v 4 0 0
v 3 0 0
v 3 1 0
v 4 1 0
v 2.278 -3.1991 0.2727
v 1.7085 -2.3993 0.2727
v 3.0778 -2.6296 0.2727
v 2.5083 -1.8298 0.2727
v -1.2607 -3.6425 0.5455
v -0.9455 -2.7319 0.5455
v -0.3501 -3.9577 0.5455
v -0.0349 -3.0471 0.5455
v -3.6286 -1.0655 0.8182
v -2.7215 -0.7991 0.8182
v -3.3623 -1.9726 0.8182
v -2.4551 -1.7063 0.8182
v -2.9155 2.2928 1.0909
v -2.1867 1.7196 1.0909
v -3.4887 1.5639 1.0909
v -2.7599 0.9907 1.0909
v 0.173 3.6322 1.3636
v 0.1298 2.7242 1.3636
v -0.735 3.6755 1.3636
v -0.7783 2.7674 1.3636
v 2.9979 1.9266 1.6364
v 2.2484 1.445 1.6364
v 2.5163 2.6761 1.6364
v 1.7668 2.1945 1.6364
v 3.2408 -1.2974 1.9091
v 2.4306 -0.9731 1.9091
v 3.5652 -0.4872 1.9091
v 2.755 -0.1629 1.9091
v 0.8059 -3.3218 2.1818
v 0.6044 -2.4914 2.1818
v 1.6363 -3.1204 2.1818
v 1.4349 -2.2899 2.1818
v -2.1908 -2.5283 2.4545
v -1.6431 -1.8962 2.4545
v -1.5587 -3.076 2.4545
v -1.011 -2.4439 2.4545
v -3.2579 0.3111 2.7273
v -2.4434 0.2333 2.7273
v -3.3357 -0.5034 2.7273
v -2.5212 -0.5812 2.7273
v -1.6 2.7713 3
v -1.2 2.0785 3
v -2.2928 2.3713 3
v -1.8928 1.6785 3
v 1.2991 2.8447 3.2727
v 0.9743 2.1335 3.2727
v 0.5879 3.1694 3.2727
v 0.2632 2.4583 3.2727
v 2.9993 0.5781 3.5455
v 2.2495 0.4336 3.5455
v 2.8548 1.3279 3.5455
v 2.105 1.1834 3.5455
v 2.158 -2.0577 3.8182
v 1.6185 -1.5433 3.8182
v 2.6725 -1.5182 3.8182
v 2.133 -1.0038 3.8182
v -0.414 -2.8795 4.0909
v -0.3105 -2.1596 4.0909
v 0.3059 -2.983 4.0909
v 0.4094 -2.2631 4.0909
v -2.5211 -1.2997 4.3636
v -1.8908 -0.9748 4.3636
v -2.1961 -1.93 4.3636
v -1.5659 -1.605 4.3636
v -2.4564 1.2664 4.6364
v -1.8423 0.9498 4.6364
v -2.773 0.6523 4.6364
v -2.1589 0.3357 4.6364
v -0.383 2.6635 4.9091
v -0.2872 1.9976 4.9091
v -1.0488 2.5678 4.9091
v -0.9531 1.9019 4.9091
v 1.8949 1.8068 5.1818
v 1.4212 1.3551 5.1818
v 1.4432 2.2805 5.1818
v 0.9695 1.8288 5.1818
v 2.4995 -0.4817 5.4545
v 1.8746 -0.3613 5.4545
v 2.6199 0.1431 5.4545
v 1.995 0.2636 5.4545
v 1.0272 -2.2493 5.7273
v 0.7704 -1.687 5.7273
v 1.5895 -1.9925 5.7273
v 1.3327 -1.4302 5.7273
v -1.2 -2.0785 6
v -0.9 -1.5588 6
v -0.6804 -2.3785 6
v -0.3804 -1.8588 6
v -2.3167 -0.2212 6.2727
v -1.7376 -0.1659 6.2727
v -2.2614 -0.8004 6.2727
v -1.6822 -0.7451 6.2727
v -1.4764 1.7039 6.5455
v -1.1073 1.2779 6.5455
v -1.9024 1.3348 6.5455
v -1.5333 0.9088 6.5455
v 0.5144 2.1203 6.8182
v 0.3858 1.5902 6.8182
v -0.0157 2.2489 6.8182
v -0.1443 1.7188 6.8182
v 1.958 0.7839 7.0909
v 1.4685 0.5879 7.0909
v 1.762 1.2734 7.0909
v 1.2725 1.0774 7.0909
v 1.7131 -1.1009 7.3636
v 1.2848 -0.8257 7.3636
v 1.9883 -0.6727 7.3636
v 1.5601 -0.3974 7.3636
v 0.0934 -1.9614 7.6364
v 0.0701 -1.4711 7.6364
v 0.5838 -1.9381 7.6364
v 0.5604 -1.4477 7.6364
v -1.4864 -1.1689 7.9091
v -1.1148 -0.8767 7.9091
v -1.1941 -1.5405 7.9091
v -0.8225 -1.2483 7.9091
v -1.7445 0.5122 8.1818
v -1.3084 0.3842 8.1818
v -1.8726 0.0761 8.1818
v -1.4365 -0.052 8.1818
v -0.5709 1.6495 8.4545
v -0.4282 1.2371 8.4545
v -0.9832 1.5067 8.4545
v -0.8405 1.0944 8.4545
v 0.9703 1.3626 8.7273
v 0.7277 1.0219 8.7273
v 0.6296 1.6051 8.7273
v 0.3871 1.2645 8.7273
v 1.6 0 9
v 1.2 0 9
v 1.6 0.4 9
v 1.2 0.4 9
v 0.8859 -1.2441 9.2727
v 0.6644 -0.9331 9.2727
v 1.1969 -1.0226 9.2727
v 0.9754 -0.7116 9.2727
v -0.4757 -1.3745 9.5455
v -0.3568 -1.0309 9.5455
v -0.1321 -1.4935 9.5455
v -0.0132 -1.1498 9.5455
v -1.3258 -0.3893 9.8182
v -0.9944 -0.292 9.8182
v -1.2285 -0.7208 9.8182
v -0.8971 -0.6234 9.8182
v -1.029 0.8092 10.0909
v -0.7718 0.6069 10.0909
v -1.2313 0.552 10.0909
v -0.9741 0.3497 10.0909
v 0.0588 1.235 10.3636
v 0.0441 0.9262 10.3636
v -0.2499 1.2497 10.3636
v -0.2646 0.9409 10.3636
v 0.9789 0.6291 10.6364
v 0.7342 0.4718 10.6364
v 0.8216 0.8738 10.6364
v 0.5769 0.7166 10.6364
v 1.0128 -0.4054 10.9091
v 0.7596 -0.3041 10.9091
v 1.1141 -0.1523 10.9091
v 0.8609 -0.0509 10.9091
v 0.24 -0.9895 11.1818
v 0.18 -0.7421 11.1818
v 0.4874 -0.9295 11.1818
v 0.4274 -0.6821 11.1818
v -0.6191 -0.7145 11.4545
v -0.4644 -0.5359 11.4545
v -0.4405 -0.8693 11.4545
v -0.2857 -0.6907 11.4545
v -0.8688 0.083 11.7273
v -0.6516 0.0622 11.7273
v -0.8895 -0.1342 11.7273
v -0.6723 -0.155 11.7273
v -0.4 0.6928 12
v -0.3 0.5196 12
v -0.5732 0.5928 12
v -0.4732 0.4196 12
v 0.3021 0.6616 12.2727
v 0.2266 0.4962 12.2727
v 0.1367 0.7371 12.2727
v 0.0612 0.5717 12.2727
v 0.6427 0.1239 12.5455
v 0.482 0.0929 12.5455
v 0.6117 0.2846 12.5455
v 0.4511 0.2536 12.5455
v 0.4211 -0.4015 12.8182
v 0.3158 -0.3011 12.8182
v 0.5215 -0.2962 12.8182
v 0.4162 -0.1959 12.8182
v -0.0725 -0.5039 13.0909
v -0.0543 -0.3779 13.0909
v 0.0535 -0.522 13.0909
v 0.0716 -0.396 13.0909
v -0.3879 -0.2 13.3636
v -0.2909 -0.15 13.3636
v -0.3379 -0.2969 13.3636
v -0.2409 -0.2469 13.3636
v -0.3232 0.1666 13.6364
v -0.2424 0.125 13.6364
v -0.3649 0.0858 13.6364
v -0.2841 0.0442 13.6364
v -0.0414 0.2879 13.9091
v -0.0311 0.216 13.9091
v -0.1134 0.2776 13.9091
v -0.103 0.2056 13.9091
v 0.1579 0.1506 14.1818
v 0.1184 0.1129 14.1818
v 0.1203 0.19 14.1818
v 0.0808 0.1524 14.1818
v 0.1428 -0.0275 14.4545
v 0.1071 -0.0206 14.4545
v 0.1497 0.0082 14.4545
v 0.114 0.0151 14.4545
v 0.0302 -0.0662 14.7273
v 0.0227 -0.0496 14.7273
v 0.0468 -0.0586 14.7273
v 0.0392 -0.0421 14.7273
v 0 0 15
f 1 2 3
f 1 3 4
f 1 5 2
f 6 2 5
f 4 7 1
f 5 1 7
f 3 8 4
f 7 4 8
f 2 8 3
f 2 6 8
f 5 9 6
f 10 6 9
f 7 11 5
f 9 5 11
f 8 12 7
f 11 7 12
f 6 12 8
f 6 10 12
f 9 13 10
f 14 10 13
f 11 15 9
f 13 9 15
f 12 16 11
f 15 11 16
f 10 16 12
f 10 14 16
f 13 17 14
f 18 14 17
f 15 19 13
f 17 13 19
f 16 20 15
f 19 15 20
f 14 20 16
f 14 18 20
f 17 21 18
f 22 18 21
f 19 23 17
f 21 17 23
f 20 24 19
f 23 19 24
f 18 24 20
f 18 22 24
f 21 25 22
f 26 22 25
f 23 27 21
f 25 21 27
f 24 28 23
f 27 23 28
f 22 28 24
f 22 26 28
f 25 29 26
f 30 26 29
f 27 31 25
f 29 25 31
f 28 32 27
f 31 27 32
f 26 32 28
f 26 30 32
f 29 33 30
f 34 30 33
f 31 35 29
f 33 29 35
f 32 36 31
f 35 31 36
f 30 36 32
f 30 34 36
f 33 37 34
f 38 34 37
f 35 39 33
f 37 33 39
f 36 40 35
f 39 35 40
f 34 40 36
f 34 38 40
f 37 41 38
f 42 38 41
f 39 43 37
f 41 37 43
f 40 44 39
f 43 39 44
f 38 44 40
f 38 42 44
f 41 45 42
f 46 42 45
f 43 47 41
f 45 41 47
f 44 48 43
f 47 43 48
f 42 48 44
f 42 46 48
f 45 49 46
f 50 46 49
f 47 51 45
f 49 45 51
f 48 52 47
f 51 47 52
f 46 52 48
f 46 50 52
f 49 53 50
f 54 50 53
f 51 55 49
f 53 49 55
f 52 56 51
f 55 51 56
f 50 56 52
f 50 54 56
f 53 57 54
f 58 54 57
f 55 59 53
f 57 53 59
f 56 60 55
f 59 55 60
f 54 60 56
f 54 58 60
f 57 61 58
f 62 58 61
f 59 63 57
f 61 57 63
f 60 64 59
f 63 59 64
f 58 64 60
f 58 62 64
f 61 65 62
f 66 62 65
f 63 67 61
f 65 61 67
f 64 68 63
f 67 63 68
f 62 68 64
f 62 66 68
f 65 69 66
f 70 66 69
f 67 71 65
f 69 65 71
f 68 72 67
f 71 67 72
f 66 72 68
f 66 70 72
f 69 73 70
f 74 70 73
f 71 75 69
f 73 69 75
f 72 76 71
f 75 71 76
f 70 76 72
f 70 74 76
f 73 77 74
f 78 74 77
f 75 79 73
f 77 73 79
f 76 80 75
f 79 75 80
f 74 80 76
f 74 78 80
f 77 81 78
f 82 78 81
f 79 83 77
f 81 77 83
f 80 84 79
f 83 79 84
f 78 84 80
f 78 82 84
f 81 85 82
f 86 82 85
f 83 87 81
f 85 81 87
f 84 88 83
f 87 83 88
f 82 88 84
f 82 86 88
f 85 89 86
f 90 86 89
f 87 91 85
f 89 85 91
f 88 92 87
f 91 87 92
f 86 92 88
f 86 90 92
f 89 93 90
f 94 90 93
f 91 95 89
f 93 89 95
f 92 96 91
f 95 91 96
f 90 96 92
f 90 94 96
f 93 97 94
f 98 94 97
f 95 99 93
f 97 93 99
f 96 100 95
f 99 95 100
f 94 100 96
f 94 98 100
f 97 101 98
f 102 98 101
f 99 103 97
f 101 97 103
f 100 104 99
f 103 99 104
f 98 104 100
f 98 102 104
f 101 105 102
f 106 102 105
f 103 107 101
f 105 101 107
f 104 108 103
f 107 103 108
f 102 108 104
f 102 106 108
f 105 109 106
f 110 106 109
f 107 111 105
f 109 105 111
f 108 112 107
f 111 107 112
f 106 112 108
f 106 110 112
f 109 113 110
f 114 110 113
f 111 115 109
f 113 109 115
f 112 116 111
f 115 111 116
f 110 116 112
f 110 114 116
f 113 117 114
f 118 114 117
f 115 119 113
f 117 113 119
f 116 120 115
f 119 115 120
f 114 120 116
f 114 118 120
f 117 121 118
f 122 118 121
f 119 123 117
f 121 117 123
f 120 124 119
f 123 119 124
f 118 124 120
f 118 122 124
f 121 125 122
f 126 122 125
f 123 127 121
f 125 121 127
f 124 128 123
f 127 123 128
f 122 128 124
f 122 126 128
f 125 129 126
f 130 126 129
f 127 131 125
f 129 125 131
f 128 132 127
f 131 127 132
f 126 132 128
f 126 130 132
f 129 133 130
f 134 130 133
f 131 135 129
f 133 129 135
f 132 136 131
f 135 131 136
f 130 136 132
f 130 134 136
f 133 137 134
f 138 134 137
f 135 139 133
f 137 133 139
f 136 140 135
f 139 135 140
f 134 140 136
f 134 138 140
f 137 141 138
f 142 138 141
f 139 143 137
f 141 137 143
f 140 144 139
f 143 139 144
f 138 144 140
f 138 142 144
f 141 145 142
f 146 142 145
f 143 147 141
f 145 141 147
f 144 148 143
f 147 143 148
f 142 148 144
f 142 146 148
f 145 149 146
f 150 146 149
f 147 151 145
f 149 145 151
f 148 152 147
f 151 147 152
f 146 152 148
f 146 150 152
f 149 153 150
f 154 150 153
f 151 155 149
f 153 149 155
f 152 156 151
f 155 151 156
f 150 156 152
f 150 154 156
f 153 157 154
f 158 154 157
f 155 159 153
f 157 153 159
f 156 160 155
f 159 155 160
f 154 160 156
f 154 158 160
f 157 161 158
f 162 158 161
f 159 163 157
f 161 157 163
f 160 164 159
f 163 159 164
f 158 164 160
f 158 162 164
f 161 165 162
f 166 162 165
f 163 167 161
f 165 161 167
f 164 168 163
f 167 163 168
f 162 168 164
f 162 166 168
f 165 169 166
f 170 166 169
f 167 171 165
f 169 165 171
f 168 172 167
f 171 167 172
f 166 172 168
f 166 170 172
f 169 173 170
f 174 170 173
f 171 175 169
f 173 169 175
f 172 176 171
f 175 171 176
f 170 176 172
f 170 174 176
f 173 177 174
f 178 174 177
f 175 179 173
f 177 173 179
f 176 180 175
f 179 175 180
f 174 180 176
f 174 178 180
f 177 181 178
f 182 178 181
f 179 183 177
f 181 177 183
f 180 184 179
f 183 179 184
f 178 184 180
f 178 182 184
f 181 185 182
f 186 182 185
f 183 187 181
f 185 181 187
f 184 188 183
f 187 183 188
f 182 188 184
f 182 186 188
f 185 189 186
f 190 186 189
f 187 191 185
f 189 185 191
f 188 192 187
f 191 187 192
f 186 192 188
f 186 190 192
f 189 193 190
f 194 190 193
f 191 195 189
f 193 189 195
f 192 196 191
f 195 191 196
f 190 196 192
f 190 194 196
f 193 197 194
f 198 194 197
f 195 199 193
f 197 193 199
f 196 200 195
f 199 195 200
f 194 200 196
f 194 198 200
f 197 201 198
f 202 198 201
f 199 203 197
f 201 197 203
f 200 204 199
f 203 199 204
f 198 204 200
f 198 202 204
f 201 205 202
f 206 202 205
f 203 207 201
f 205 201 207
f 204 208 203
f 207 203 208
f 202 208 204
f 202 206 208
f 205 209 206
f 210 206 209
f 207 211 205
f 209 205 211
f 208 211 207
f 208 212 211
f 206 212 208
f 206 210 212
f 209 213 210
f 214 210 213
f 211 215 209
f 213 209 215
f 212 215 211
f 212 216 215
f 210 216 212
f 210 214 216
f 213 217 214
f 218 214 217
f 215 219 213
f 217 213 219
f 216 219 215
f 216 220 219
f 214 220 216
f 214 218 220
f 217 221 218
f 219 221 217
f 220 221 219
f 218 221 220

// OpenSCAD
linear_extrude(height = 15, convexity = 10, twist = 3000, scale = -7)
translate([3, 0, 0])
square(1);
